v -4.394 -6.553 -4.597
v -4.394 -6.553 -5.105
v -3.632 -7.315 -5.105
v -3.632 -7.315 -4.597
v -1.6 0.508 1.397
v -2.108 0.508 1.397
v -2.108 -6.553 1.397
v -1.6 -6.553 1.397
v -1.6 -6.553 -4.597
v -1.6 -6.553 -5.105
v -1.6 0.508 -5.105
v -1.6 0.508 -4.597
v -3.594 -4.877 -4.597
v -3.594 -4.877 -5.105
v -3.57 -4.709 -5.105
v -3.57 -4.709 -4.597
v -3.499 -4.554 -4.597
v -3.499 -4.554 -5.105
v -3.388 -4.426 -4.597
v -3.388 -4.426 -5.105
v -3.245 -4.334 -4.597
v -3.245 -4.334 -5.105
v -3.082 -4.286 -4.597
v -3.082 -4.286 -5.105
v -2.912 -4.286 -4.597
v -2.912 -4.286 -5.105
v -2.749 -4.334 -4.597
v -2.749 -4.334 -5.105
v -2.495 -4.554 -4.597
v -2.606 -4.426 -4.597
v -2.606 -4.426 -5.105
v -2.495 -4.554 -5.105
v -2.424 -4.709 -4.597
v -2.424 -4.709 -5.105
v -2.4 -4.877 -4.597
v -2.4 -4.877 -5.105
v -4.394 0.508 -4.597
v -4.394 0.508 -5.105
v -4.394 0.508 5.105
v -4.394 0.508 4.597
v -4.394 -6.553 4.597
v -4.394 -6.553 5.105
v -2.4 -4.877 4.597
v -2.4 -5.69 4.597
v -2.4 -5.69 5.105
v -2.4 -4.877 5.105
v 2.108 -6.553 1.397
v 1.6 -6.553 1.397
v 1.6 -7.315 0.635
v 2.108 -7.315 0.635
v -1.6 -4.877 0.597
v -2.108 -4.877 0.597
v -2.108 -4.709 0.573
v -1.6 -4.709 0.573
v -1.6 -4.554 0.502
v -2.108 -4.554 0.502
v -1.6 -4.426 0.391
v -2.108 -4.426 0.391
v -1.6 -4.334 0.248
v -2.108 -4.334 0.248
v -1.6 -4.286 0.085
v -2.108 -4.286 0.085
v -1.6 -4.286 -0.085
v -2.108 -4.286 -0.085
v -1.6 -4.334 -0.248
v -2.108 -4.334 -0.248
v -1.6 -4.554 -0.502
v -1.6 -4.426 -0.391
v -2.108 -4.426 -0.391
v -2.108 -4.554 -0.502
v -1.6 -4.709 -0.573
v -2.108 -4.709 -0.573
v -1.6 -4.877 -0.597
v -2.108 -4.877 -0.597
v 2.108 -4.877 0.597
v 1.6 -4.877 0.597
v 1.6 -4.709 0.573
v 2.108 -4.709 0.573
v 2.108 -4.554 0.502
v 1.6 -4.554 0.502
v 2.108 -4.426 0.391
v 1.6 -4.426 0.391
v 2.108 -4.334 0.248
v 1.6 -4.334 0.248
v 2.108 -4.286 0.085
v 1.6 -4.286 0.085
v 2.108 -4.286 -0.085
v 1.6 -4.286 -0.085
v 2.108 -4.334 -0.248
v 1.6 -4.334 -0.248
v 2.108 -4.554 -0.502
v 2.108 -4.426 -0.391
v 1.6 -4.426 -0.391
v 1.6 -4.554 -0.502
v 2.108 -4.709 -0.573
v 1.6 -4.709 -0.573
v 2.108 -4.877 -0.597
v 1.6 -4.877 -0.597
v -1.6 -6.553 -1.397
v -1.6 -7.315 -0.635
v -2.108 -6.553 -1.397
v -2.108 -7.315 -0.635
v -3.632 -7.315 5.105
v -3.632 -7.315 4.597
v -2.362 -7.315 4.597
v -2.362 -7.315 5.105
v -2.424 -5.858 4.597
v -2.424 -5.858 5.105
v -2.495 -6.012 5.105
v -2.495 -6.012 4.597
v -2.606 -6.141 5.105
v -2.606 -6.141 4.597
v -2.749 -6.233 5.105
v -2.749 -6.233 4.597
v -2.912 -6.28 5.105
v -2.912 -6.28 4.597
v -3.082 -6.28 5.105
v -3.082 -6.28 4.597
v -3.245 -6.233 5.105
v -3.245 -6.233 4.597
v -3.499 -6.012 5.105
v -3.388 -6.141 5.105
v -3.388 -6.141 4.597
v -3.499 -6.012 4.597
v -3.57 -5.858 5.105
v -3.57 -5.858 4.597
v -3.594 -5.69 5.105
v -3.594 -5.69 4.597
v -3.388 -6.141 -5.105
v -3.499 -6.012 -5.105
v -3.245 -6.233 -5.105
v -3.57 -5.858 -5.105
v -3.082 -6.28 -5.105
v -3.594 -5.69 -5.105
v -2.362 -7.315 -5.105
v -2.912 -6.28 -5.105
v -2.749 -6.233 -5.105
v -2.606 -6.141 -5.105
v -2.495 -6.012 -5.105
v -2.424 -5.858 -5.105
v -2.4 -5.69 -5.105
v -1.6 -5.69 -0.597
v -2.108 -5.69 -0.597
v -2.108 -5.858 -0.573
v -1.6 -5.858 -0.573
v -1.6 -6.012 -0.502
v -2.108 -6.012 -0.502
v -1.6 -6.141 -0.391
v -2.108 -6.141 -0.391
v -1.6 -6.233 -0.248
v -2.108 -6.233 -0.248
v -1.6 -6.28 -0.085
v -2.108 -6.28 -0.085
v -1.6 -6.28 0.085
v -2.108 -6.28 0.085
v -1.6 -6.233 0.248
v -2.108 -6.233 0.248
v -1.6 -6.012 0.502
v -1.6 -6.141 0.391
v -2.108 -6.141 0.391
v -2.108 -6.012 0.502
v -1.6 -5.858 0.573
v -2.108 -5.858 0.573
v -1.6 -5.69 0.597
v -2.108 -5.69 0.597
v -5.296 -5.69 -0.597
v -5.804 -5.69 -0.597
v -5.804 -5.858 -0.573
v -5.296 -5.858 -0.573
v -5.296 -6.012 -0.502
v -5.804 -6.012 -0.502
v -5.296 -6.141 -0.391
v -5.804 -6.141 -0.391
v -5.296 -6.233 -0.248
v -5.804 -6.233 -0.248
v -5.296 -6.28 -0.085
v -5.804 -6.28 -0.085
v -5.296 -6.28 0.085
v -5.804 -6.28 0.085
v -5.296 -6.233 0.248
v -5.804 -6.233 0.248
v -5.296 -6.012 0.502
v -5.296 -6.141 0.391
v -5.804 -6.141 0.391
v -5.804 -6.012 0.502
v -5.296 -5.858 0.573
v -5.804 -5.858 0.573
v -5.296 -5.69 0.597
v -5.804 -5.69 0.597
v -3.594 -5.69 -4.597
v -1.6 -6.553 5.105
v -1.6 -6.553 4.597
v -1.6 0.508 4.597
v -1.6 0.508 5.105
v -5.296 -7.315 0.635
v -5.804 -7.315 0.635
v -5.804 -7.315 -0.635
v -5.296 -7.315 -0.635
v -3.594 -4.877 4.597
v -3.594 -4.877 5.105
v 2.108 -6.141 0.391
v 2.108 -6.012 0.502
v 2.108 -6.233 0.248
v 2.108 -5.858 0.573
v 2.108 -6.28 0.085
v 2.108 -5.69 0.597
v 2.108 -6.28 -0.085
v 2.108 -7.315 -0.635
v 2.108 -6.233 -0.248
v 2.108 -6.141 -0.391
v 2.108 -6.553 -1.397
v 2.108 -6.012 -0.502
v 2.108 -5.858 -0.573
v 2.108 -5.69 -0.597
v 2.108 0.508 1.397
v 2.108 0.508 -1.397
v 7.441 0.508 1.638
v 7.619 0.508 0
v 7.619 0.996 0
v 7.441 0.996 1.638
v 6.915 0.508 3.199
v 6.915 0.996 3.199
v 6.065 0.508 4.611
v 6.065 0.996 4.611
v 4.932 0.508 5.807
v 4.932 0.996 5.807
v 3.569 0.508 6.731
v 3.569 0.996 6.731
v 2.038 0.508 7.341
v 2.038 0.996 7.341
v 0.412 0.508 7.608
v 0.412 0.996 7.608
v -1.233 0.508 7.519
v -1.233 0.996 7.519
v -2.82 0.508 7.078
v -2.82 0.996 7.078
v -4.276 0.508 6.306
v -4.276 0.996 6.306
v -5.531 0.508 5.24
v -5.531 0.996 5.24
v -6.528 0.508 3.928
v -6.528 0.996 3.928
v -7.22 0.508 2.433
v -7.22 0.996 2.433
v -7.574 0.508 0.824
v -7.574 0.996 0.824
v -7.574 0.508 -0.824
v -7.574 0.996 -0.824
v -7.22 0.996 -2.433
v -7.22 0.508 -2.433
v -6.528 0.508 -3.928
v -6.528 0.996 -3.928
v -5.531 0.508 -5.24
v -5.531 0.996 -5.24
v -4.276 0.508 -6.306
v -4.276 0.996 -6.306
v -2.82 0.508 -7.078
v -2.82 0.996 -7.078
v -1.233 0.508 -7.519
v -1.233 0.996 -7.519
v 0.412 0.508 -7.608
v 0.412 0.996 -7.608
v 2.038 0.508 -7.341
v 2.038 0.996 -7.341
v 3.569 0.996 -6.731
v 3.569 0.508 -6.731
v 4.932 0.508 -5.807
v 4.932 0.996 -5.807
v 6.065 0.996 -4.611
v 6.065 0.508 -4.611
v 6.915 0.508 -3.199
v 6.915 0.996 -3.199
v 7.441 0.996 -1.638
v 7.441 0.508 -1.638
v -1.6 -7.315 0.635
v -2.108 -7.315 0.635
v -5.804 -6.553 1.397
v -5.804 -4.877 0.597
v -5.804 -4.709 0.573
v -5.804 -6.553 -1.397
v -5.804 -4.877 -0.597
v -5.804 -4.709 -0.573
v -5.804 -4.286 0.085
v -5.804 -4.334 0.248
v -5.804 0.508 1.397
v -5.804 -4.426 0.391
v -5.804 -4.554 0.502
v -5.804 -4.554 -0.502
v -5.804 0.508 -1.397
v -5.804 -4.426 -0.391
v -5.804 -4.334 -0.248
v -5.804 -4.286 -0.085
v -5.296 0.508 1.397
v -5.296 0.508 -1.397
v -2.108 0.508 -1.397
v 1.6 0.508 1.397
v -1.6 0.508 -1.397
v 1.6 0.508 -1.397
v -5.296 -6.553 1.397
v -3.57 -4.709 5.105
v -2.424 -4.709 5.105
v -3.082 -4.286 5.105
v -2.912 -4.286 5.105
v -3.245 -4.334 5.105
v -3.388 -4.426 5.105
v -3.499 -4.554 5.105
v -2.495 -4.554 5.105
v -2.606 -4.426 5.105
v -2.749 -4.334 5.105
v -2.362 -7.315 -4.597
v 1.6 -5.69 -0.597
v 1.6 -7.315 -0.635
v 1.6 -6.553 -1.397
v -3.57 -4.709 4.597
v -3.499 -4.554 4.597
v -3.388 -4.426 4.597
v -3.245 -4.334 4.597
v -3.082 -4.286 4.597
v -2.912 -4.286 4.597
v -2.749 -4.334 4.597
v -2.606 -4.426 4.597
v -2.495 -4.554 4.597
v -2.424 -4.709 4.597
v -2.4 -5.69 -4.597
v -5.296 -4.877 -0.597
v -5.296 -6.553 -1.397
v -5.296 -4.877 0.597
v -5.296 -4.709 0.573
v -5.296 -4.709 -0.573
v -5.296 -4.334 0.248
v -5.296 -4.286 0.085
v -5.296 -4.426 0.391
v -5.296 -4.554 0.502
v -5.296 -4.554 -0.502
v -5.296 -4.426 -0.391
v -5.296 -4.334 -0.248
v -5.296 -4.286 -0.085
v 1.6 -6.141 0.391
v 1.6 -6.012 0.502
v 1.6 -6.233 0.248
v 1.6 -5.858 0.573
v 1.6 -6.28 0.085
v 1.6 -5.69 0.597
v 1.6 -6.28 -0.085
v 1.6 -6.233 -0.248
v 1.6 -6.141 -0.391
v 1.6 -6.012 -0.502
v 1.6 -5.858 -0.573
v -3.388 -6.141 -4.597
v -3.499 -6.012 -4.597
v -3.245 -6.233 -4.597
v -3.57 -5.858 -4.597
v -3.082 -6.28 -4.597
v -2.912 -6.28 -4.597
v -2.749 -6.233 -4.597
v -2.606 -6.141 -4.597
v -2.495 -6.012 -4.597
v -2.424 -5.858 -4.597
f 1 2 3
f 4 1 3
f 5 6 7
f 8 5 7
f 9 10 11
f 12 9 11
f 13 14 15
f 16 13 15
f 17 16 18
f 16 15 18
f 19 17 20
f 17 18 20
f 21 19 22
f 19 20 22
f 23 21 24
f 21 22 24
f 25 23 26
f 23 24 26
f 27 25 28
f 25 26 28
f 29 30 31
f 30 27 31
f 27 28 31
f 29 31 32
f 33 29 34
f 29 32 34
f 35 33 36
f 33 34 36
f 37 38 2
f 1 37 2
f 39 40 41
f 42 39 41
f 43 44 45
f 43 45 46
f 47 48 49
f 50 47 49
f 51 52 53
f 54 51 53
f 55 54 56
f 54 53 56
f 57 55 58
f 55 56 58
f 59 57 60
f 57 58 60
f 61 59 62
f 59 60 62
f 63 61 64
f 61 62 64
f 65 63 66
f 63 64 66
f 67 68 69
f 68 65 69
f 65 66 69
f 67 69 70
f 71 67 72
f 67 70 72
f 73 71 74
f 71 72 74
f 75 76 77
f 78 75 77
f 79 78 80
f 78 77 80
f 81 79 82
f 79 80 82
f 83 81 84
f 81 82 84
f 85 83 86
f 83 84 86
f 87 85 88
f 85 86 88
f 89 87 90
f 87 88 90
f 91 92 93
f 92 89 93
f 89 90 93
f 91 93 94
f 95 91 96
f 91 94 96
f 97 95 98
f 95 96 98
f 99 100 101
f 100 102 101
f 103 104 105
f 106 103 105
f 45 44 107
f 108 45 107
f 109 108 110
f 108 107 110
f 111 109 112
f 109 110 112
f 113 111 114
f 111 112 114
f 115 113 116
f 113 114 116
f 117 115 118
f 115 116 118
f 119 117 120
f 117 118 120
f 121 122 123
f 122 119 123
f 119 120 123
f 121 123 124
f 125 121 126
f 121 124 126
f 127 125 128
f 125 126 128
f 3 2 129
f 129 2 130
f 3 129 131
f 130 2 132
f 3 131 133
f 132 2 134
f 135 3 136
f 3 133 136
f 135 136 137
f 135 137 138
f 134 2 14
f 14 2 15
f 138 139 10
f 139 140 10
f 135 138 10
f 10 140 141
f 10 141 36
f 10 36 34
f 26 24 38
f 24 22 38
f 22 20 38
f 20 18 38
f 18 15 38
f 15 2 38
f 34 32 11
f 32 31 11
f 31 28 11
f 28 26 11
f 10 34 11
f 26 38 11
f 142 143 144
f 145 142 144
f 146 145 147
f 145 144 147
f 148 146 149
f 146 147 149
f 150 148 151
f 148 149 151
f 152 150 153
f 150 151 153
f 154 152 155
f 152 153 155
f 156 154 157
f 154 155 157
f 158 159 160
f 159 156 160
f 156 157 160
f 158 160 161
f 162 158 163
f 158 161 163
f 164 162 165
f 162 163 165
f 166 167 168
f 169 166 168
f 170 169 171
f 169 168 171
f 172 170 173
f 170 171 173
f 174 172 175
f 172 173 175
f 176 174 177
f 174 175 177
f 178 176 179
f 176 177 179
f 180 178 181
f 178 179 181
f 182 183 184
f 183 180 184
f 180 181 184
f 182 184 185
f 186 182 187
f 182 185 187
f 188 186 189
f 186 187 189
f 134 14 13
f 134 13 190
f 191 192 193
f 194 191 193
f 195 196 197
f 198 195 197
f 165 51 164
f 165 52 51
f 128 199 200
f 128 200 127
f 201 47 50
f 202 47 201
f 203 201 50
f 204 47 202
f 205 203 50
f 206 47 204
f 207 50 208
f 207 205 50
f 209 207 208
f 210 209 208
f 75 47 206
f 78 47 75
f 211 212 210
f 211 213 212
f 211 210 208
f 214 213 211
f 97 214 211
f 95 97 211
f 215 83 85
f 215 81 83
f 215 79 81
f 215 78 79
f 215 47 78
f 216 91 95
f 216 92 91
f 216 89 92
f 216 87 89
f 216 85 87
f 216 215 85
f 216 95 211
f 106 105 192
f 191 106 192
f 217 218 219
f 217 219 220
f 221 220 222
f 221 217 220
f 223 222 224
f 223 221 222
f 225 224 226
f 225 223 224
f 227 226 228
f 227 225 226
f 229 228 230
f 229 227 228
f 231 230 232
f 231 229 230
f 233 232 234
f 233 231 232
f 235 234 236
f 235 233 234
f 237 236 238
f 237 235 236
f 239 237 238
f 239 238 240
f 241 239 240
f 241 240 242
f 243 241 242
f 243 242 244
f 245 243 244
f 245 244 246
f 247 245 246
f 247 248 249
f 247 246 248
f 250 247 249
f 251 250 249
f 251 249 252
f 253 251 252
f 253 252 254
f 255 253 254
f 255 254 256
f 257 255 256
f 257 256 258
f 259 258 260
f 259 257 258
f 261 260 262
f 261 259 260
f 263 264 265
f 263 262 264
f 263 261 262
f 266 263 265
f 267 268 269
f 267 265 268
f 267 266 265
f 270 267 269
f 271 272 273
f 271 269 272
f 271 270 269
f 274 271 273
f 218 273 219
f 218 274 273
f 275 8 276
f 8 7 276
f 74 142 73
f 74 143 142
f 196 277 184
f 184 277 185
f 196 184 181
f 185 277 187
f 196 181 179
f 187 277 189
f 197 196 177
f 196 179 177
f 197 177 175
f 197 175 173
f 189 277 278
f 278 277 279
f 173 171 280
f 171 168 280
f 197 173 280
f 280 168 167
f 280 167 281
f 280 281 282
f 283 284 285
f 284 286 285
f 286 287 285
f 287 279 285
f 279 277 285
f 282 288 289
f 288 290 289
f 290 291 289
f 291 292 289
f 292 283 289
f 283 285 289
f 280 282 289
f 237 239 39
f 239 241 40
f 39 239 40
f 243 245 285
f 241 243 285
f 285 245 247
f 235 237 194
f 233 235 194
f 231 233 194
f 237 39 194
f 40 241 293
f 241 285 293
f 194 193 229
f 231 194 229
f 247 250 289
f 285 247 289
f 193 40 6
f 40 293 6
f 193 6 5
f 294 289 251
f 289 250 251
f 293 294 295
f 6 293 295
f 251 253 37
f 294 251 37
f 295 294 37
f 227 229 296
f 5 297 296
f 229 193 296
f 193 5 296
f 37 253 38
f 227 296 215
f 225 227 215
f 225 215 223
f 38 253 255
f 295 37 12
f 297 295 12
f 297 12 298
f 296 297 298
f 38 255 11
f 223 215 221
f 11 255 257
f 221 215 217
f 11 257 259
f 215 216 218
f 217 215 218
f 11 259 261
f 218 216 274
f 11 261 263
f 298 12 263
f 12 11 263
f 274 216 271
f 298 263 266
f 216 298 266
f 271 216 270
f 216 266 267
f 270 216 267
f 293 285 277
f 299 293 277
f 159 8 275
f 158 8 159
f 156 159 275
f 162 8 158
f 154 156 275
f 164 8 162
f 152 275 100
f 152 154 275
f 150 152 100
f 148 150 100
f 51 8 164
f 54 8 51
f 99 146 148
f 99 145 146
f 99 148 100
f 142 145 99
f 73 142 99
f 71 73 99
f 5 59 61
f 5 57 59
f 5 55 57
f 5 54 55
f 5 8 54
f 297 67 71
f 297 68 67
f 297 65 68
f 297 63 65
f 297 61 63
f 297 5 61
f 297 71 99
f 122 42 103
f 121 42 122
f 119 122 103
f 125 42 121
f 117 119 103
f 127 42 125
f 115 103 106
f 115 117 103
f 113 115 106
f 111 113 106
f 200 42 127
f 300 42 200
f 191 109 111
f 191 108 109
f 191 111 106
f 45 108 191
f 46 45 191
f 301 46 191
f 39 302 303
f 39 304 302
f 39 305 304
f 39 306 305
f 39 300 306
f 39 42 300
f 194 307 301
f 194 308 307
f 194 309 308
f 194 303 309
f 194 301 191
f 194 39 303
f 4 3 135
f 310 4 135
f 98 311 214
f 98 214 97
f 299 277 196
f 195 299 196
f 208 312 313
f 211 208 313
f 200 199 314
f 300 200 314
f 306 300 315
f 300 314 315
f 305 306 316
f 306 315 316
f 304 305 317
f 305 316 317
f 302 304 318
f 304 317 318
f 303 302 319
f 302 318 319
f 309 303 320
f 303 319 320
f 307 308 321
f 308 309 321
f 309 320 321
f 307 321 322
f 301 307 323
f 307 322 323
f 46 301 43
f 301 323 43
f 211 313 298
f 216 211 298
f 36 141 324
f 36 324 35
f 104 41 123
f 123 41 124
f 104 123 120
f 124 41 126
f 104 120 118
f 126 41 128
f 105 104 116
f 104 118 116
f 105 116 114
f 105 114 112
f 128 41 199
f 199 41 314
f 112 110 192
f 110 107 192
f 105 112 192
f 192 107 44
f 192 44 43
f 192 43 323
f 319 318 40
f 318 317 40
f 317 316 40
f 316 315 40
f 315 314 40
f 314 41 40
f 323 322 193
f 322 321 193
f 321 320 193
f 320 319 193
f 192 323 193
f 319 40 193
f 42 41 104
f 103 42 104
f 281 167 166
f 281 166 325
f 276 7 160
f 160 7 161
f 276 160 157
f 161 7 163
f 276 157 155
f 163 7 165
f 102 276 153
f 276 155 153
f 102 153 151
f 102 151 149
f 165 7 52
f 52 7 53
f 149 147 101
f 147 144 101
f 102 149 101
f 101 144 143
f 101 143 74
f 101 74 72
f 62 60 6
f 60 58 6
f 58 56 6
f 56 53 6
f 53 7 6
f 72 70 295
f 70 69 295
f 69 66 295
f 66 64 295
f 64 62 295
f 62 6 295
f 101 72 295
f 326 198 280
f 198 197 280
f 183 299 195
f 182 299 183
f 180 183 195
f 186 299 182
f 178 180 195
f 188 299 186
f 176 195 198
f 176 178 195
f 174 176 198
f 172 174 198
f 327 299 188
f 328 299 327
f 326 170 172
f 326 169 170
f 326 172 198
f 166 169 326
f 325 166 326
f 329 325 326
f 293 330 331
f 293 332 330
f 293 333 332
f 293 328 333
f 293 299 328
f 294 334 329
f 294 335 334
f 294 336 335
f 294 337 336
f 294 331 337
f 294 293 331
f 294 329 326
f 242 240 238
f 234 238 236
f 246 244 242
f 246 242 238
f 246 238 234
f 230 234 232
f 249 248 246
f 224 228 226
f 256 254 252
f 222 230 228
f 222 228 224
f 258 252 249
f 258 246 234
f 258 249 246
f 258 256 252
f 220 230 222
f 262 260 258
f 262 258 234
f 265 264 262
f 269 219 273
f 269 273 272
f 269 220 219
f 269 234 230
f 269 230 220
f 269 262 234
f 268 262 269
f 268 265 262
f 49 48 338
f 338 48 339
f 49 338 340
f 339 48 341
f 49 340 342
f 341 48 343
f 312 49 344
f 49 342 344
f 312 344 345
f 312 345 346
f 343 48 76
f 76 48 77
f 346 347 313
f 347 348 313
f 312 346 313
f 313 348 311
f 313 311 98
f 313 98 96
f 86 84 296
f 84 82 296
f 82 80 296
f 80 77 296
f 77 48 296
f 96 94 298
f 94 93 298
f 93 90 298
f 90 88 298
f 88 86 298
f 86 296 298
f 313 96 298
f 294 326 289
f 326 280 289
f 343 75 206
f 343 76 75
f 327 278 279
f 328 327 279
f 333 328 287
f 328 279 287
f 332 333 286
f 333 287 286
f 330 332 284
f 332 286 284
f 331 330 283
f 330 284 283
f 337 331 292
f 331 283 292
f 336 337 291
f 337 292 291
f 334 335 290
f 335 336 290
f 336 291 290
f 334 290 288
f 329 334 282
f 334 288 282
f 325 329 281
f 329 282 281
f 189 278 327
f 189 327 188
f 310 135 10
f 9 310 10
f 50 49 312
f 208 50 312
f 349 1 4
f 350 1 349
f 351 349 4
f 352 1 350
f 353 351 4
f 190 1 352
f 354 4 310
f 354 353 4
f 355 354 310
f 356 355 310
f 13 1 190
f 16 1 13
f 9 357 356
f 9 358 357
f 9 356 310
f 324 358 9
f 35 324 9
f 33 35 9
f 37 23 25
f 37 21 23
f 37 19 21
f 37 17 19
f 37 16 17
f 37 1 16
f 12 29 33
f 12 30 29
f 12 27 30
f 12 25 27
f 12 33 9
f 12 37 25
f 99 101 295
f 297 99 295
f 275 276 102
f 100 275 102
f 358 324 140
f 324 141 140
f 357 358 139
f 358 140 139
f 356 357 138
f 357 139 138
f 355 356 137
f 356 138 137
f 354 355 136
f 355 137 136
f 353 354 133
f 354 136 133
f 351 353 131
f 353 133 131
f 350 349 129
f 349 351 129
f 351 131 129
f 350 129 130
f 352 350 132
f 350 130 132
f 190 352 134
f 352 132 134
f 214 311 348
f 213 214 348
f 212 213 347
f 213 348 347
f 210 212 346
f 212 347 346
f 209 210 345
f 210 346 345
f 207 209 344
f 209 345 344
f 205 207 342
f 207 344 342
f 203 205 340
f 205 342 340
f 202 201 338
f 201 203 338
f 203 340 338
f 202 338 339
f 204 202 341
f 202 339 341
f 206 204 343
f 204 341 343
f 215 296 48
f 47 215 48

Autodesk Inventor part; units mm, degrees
sketch "Sketch_1" plane through (0, 0.508, 0) normal (0, 1, 0) x (1, 0, 0)
  circle A0 centre (0, 0) radius 7.619
extrude "Extrusion1" add sketch "Sketch_1" along normal blind 0.4877
sketch "Sketch_8" plane through (1.8542, 0, 0) normal (1, 0, 0) x (0, 0, -1)
  line L0 (-1.397, -6.5532) -> (-0.635, -7.3152)
  line L1 (-0.635, -7.3152) -> (0.635, -7.3152)
  line L2 (0.635, -7.3152) -> (1.397, -6.5532)
  line L3 (1.397, -6.5532) -> (1.397, 0.762)
  line L4 (1.397, 0.762) -> (-1.397, 0.762)
  line L5 (-1.397, 0.762) -> (-1.397, -6.5532)
  line L6 (-0.5969, -4.8768) -> (-0.5969, -5.6896)
  arc A0 (-0.5969, -5.6896) -> (0.5969, -5.6896) centre (0, -5.6896) ccw
  line L7 (0.5969, -5.6896) -> (0.5969, -4.8768)
  arc A1 (0.5969, -4.8768) -> (-0.5969, -4.8768) centre (0, -4.8768) ccw
extrude "Extrusion2" add sketch "Sketch_8" along normal mid plane 0.508
sketch "Sketch_7" plane through (-1.8542, 0, 0) normal (1, 0, 0) x (0, 0, -1)
  line L0 (-1.397, -6.5532) -> (-0.635, -7.3152)
  line L1 (-0.635, -7.3152) -> (0.635, -7.3152)
  line L2 (0.635, -7.3152) -> (1.397, -6.5532)
  line L3 (1.397, -6.5532) -> (1.397, 0.762)
  line L4 (1.397, 0.762) -> (-1.397, 0.762)
  line L5 (-1.397, 0.762) -> (-1.397, -6.5532)
  line L6 (-0.5969, -4.8768) -> (-0.5969, -5.6896)
  arc A0 (-0.5969, -5.6896) -> (0.5969, -5.6896) centre (0, -5.6896) ccw
  line L7 (0.5969, -5.6896) -> (0.5969, -4.8768)
  arc A1 (0.5969, -4.8768) -> (-0.5969, -4.8768) centre (0, -4.8768) ccw
extrude "Extrusion3" add sketch "Sketch_7" along normal mid plane 0.508
sketch "Sketch_9" plane through (-5.5499, 0, 0) normal (1, 0, 0) x (0, 0, -1)
  line L0 (-1.397, -6.5532) -> (-0.635, -7.3152)
  line L1 (-0.635, -7.3152) -> (0.635, -7.3152)
  line L2 (0.635, -7.3152) -> (1.397, -6.5532)
  line L3 (1.397, -6.5532) -> (1.397, 0.762)
  line L4 (1.397, 0.762) -> (-1.397, 0.762)
  line L5 (-1.397, 0.762) -> (-1.397, -6.5532)
  line L6 (-0.5969, -4.8768) -> (-0.5969, -5.6896)
  arc A0 (-0.5969, -5.6896) -> (0.5969, -5.6896) centre (0, -5.6896) ccw
  line L7 (0.5969, -5.6896) -> (0.5969, -4.8768)
  arc A1 (0.5969, -4.8768) -> (-0.5969, -4.8768) centre (0, -4.8768) ccw
extrude "Extrusion4" add sketch "Sketch_9" along normal mid plane 0.508
sketch "Sketch_2" plane through (0, 0, 4.8514) normal (0, 0, 1) x (1, 0, 0)
  line L0 (-4.3942, -6.5532) -> (-3.6322, -7.3152)
  line L1 (-3.6322, -7.3152) -> (-2.3622, -7.3152)
  line L2 (-2.3622, -7.3152) -> (-1.6002, -6.5532)
  line L3 (-1.6002, -6.5532) -> (-1.6002, 0.762)
  line L4 (-1.6002, 0.762) -> (-4.3942, 0.762)
  line L5 (-4.3942, 0.762) -> (-4.3942, -6.5532)
  line L6 (-3.5941, -4.8768) -> (-3.5941, -5.6896)
  arc A0 (-3.5941, -5.6896) -> (-2.4003, -5.6896) centre (-2.9972, -5.6896) ccw
  line L7 (-2.4003, -5.6896) -> (-2.4003, -4.8768)
  arc A1 (-2.4003, -4.8768) -> (-3.5941, -4.8768) centre (-2.9972, -4.8768) ccw
extrude "Extrusion5" add sketch "Sketch_2" along normal mid plane 0.508
sketch "Sketch_11" plane through (0, 0, -4.8514) normal (0, 0, 1) x (1, 0, 0)
  line L0 (-4.3942, -6.5532) -> (-3.6322, -7.3152)
  line L1 (-3.6322, -7.3152) -> (-2.3622, -7.3152)
  line L2 (-2.3622, -7.3152) -> (-1.6002, -6.5532)
  line L3 (-1.6002, -6.5532) -> (-1.6002, 0.762)
  line L4 (-1.6002, 0.762) -> (-4.3942, 0.762)
  line L5 (-4.3942, 0.762) -> (-4.3942, -6.5532)
  line L6 (-3.5941, -4.8768) -> (-3.5941, -5.6896)
  arc A0 (-3.5941, -5.6896) -> (-2.4003, -5.6896) centre (-2.9972, -5.6896) ccw
  line L7 (-2.4003, -5.6896) -> (-2.4003, -4.8768)
  arc A1 (-2.4003, -4.8768) -> (-3.5941, -4.8768) centre (-2.9972, -4.8768) ccw
extrude "Extrusion6" add sketch "Sketch_11" along normal mid plane 0.508
ref_plane "terminal_to_body_XY" through (0, 16.9926, 0) normal (0, 1, 0) x (1, 0, 0)
ref_plane "terminal_to_body_YZ" through (0, 16.9926, 0) normal (1, 0, 0) x (0, 0, -1)
ref_plane "terminal_to_body_ZX" through (0, 16.9926, 0) normal (0, 0, -1) x (0, 1, 0)
properties part number "YB16SKW01-05-BBterminal"
